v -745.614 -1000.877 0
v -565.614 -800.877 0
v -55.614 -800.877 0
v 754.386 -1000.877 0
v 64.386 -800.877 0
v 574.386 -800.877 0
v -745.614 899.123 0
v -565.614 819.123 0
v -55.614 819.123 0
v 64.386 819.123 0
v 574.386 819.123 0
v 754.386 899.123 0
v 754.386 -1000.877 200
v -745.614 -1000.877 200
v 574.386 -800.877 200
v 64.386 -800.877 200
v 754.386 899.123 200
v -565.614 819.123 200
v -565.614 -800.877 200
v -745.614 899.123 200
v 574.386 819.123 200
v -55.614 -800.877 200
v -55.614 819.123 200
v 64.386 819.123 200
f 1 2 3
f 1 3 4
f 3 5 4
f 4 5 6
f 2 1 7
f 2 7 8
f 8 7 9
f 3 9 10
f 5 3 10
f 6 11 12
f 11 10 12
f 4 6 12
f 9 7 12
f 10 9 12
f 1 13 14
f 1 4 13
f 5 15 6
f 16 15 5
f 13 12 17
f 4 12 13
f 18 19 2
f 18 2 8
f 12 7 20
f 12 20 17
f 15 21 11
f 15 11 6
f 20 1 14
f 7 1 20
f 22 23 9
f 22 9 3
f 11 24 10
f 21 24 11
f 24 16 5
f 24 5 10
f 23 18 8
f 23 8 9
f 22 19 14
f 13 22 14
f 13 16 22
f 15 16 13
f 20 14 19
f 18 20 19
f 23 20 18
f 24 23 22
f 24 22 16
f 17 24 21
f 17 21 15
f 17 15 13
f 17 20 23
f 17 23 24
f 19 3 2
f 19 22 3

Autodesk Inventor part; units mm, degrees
ref_plane "YZ Plane" through (0, 0, 0) normal (1, 0, 0) x (0, 1, 0)
ref_plane "XZ Plane" through (0, 0, 0) normal (0, 1, 0) x (-1, 0, 0)
ref_plane "XY Plane" through (0, 0, 0) normal (0, 0, 1) x (1, 0, 0)
sketch "Esquisse1" plane through (0, 0, 0) normal (0, 0, 1) x (1, 0, 0)
  line L0 (-745.614, 899.1228) -> (754.386, 899.1228)
  line L1 (754.386, 899.1228) -> (754.386, -1000.8772)
  line L2 (754.386, -1000.8772) -> (-745.614, -1000.8772)
  line L3 (-745.614, -1000.8772) -> (-745.614, 899.1228)
  point P0 (0, 0)
  dimension "d0" = 1500
  dimension "d1" = 1900
extrude "Extrusion1" add sketch "Esquisse1" along normal blind 200
sketch "Esquisse2" plane through (0, 0, 200) normal (0, 0, 1) x (1, 0, 0)
  line L0 (-565.614, 819.1228) -> (-55.614, 819.1228)
  line L1 (-55.614, 819.1228) -> (-55.614, -800.8772)
  line L2 (-55.614, -800.8772) -> (-565.614, -800.8772)
  line L3 (-565.614, -800.8772) -> (-565.614, 819.1228)
  line L4 (64.386, 819.1228) -> (574.386, 819.1228)
  line L5 (574.386, 819.1228) -> (574.386, -800.8772)
  line L6 (574.386, -800.8772) -> (64.386, -800.8772)
  line L7 (64.386, -800.8772) -> (64.386, 819.1228)
  line L8 (-745.614, 899.1228) -> (-745.614, -1000.8772) projected
  line L9 (754.386, -1000.8772) -> (754.386, 899.1228) projected
  line L10 (-745.614, -1000.8772) -> (754.386, -1000.8772) projected
  point P0 (0, 0)
  dimension "d4" = 510
  dimension "d5" = 510
  dimension "d6" = 1620
  dimension "d7" = 1620
  dimension "d8" = 180
  dimension "d9" = 180
  dimension "d10" = 200
extrude "Extrusion2" cut sketch "Esquisse2" against normal blind 200
properties part number "Fenetre-Bords" material "Plastique ABS"
